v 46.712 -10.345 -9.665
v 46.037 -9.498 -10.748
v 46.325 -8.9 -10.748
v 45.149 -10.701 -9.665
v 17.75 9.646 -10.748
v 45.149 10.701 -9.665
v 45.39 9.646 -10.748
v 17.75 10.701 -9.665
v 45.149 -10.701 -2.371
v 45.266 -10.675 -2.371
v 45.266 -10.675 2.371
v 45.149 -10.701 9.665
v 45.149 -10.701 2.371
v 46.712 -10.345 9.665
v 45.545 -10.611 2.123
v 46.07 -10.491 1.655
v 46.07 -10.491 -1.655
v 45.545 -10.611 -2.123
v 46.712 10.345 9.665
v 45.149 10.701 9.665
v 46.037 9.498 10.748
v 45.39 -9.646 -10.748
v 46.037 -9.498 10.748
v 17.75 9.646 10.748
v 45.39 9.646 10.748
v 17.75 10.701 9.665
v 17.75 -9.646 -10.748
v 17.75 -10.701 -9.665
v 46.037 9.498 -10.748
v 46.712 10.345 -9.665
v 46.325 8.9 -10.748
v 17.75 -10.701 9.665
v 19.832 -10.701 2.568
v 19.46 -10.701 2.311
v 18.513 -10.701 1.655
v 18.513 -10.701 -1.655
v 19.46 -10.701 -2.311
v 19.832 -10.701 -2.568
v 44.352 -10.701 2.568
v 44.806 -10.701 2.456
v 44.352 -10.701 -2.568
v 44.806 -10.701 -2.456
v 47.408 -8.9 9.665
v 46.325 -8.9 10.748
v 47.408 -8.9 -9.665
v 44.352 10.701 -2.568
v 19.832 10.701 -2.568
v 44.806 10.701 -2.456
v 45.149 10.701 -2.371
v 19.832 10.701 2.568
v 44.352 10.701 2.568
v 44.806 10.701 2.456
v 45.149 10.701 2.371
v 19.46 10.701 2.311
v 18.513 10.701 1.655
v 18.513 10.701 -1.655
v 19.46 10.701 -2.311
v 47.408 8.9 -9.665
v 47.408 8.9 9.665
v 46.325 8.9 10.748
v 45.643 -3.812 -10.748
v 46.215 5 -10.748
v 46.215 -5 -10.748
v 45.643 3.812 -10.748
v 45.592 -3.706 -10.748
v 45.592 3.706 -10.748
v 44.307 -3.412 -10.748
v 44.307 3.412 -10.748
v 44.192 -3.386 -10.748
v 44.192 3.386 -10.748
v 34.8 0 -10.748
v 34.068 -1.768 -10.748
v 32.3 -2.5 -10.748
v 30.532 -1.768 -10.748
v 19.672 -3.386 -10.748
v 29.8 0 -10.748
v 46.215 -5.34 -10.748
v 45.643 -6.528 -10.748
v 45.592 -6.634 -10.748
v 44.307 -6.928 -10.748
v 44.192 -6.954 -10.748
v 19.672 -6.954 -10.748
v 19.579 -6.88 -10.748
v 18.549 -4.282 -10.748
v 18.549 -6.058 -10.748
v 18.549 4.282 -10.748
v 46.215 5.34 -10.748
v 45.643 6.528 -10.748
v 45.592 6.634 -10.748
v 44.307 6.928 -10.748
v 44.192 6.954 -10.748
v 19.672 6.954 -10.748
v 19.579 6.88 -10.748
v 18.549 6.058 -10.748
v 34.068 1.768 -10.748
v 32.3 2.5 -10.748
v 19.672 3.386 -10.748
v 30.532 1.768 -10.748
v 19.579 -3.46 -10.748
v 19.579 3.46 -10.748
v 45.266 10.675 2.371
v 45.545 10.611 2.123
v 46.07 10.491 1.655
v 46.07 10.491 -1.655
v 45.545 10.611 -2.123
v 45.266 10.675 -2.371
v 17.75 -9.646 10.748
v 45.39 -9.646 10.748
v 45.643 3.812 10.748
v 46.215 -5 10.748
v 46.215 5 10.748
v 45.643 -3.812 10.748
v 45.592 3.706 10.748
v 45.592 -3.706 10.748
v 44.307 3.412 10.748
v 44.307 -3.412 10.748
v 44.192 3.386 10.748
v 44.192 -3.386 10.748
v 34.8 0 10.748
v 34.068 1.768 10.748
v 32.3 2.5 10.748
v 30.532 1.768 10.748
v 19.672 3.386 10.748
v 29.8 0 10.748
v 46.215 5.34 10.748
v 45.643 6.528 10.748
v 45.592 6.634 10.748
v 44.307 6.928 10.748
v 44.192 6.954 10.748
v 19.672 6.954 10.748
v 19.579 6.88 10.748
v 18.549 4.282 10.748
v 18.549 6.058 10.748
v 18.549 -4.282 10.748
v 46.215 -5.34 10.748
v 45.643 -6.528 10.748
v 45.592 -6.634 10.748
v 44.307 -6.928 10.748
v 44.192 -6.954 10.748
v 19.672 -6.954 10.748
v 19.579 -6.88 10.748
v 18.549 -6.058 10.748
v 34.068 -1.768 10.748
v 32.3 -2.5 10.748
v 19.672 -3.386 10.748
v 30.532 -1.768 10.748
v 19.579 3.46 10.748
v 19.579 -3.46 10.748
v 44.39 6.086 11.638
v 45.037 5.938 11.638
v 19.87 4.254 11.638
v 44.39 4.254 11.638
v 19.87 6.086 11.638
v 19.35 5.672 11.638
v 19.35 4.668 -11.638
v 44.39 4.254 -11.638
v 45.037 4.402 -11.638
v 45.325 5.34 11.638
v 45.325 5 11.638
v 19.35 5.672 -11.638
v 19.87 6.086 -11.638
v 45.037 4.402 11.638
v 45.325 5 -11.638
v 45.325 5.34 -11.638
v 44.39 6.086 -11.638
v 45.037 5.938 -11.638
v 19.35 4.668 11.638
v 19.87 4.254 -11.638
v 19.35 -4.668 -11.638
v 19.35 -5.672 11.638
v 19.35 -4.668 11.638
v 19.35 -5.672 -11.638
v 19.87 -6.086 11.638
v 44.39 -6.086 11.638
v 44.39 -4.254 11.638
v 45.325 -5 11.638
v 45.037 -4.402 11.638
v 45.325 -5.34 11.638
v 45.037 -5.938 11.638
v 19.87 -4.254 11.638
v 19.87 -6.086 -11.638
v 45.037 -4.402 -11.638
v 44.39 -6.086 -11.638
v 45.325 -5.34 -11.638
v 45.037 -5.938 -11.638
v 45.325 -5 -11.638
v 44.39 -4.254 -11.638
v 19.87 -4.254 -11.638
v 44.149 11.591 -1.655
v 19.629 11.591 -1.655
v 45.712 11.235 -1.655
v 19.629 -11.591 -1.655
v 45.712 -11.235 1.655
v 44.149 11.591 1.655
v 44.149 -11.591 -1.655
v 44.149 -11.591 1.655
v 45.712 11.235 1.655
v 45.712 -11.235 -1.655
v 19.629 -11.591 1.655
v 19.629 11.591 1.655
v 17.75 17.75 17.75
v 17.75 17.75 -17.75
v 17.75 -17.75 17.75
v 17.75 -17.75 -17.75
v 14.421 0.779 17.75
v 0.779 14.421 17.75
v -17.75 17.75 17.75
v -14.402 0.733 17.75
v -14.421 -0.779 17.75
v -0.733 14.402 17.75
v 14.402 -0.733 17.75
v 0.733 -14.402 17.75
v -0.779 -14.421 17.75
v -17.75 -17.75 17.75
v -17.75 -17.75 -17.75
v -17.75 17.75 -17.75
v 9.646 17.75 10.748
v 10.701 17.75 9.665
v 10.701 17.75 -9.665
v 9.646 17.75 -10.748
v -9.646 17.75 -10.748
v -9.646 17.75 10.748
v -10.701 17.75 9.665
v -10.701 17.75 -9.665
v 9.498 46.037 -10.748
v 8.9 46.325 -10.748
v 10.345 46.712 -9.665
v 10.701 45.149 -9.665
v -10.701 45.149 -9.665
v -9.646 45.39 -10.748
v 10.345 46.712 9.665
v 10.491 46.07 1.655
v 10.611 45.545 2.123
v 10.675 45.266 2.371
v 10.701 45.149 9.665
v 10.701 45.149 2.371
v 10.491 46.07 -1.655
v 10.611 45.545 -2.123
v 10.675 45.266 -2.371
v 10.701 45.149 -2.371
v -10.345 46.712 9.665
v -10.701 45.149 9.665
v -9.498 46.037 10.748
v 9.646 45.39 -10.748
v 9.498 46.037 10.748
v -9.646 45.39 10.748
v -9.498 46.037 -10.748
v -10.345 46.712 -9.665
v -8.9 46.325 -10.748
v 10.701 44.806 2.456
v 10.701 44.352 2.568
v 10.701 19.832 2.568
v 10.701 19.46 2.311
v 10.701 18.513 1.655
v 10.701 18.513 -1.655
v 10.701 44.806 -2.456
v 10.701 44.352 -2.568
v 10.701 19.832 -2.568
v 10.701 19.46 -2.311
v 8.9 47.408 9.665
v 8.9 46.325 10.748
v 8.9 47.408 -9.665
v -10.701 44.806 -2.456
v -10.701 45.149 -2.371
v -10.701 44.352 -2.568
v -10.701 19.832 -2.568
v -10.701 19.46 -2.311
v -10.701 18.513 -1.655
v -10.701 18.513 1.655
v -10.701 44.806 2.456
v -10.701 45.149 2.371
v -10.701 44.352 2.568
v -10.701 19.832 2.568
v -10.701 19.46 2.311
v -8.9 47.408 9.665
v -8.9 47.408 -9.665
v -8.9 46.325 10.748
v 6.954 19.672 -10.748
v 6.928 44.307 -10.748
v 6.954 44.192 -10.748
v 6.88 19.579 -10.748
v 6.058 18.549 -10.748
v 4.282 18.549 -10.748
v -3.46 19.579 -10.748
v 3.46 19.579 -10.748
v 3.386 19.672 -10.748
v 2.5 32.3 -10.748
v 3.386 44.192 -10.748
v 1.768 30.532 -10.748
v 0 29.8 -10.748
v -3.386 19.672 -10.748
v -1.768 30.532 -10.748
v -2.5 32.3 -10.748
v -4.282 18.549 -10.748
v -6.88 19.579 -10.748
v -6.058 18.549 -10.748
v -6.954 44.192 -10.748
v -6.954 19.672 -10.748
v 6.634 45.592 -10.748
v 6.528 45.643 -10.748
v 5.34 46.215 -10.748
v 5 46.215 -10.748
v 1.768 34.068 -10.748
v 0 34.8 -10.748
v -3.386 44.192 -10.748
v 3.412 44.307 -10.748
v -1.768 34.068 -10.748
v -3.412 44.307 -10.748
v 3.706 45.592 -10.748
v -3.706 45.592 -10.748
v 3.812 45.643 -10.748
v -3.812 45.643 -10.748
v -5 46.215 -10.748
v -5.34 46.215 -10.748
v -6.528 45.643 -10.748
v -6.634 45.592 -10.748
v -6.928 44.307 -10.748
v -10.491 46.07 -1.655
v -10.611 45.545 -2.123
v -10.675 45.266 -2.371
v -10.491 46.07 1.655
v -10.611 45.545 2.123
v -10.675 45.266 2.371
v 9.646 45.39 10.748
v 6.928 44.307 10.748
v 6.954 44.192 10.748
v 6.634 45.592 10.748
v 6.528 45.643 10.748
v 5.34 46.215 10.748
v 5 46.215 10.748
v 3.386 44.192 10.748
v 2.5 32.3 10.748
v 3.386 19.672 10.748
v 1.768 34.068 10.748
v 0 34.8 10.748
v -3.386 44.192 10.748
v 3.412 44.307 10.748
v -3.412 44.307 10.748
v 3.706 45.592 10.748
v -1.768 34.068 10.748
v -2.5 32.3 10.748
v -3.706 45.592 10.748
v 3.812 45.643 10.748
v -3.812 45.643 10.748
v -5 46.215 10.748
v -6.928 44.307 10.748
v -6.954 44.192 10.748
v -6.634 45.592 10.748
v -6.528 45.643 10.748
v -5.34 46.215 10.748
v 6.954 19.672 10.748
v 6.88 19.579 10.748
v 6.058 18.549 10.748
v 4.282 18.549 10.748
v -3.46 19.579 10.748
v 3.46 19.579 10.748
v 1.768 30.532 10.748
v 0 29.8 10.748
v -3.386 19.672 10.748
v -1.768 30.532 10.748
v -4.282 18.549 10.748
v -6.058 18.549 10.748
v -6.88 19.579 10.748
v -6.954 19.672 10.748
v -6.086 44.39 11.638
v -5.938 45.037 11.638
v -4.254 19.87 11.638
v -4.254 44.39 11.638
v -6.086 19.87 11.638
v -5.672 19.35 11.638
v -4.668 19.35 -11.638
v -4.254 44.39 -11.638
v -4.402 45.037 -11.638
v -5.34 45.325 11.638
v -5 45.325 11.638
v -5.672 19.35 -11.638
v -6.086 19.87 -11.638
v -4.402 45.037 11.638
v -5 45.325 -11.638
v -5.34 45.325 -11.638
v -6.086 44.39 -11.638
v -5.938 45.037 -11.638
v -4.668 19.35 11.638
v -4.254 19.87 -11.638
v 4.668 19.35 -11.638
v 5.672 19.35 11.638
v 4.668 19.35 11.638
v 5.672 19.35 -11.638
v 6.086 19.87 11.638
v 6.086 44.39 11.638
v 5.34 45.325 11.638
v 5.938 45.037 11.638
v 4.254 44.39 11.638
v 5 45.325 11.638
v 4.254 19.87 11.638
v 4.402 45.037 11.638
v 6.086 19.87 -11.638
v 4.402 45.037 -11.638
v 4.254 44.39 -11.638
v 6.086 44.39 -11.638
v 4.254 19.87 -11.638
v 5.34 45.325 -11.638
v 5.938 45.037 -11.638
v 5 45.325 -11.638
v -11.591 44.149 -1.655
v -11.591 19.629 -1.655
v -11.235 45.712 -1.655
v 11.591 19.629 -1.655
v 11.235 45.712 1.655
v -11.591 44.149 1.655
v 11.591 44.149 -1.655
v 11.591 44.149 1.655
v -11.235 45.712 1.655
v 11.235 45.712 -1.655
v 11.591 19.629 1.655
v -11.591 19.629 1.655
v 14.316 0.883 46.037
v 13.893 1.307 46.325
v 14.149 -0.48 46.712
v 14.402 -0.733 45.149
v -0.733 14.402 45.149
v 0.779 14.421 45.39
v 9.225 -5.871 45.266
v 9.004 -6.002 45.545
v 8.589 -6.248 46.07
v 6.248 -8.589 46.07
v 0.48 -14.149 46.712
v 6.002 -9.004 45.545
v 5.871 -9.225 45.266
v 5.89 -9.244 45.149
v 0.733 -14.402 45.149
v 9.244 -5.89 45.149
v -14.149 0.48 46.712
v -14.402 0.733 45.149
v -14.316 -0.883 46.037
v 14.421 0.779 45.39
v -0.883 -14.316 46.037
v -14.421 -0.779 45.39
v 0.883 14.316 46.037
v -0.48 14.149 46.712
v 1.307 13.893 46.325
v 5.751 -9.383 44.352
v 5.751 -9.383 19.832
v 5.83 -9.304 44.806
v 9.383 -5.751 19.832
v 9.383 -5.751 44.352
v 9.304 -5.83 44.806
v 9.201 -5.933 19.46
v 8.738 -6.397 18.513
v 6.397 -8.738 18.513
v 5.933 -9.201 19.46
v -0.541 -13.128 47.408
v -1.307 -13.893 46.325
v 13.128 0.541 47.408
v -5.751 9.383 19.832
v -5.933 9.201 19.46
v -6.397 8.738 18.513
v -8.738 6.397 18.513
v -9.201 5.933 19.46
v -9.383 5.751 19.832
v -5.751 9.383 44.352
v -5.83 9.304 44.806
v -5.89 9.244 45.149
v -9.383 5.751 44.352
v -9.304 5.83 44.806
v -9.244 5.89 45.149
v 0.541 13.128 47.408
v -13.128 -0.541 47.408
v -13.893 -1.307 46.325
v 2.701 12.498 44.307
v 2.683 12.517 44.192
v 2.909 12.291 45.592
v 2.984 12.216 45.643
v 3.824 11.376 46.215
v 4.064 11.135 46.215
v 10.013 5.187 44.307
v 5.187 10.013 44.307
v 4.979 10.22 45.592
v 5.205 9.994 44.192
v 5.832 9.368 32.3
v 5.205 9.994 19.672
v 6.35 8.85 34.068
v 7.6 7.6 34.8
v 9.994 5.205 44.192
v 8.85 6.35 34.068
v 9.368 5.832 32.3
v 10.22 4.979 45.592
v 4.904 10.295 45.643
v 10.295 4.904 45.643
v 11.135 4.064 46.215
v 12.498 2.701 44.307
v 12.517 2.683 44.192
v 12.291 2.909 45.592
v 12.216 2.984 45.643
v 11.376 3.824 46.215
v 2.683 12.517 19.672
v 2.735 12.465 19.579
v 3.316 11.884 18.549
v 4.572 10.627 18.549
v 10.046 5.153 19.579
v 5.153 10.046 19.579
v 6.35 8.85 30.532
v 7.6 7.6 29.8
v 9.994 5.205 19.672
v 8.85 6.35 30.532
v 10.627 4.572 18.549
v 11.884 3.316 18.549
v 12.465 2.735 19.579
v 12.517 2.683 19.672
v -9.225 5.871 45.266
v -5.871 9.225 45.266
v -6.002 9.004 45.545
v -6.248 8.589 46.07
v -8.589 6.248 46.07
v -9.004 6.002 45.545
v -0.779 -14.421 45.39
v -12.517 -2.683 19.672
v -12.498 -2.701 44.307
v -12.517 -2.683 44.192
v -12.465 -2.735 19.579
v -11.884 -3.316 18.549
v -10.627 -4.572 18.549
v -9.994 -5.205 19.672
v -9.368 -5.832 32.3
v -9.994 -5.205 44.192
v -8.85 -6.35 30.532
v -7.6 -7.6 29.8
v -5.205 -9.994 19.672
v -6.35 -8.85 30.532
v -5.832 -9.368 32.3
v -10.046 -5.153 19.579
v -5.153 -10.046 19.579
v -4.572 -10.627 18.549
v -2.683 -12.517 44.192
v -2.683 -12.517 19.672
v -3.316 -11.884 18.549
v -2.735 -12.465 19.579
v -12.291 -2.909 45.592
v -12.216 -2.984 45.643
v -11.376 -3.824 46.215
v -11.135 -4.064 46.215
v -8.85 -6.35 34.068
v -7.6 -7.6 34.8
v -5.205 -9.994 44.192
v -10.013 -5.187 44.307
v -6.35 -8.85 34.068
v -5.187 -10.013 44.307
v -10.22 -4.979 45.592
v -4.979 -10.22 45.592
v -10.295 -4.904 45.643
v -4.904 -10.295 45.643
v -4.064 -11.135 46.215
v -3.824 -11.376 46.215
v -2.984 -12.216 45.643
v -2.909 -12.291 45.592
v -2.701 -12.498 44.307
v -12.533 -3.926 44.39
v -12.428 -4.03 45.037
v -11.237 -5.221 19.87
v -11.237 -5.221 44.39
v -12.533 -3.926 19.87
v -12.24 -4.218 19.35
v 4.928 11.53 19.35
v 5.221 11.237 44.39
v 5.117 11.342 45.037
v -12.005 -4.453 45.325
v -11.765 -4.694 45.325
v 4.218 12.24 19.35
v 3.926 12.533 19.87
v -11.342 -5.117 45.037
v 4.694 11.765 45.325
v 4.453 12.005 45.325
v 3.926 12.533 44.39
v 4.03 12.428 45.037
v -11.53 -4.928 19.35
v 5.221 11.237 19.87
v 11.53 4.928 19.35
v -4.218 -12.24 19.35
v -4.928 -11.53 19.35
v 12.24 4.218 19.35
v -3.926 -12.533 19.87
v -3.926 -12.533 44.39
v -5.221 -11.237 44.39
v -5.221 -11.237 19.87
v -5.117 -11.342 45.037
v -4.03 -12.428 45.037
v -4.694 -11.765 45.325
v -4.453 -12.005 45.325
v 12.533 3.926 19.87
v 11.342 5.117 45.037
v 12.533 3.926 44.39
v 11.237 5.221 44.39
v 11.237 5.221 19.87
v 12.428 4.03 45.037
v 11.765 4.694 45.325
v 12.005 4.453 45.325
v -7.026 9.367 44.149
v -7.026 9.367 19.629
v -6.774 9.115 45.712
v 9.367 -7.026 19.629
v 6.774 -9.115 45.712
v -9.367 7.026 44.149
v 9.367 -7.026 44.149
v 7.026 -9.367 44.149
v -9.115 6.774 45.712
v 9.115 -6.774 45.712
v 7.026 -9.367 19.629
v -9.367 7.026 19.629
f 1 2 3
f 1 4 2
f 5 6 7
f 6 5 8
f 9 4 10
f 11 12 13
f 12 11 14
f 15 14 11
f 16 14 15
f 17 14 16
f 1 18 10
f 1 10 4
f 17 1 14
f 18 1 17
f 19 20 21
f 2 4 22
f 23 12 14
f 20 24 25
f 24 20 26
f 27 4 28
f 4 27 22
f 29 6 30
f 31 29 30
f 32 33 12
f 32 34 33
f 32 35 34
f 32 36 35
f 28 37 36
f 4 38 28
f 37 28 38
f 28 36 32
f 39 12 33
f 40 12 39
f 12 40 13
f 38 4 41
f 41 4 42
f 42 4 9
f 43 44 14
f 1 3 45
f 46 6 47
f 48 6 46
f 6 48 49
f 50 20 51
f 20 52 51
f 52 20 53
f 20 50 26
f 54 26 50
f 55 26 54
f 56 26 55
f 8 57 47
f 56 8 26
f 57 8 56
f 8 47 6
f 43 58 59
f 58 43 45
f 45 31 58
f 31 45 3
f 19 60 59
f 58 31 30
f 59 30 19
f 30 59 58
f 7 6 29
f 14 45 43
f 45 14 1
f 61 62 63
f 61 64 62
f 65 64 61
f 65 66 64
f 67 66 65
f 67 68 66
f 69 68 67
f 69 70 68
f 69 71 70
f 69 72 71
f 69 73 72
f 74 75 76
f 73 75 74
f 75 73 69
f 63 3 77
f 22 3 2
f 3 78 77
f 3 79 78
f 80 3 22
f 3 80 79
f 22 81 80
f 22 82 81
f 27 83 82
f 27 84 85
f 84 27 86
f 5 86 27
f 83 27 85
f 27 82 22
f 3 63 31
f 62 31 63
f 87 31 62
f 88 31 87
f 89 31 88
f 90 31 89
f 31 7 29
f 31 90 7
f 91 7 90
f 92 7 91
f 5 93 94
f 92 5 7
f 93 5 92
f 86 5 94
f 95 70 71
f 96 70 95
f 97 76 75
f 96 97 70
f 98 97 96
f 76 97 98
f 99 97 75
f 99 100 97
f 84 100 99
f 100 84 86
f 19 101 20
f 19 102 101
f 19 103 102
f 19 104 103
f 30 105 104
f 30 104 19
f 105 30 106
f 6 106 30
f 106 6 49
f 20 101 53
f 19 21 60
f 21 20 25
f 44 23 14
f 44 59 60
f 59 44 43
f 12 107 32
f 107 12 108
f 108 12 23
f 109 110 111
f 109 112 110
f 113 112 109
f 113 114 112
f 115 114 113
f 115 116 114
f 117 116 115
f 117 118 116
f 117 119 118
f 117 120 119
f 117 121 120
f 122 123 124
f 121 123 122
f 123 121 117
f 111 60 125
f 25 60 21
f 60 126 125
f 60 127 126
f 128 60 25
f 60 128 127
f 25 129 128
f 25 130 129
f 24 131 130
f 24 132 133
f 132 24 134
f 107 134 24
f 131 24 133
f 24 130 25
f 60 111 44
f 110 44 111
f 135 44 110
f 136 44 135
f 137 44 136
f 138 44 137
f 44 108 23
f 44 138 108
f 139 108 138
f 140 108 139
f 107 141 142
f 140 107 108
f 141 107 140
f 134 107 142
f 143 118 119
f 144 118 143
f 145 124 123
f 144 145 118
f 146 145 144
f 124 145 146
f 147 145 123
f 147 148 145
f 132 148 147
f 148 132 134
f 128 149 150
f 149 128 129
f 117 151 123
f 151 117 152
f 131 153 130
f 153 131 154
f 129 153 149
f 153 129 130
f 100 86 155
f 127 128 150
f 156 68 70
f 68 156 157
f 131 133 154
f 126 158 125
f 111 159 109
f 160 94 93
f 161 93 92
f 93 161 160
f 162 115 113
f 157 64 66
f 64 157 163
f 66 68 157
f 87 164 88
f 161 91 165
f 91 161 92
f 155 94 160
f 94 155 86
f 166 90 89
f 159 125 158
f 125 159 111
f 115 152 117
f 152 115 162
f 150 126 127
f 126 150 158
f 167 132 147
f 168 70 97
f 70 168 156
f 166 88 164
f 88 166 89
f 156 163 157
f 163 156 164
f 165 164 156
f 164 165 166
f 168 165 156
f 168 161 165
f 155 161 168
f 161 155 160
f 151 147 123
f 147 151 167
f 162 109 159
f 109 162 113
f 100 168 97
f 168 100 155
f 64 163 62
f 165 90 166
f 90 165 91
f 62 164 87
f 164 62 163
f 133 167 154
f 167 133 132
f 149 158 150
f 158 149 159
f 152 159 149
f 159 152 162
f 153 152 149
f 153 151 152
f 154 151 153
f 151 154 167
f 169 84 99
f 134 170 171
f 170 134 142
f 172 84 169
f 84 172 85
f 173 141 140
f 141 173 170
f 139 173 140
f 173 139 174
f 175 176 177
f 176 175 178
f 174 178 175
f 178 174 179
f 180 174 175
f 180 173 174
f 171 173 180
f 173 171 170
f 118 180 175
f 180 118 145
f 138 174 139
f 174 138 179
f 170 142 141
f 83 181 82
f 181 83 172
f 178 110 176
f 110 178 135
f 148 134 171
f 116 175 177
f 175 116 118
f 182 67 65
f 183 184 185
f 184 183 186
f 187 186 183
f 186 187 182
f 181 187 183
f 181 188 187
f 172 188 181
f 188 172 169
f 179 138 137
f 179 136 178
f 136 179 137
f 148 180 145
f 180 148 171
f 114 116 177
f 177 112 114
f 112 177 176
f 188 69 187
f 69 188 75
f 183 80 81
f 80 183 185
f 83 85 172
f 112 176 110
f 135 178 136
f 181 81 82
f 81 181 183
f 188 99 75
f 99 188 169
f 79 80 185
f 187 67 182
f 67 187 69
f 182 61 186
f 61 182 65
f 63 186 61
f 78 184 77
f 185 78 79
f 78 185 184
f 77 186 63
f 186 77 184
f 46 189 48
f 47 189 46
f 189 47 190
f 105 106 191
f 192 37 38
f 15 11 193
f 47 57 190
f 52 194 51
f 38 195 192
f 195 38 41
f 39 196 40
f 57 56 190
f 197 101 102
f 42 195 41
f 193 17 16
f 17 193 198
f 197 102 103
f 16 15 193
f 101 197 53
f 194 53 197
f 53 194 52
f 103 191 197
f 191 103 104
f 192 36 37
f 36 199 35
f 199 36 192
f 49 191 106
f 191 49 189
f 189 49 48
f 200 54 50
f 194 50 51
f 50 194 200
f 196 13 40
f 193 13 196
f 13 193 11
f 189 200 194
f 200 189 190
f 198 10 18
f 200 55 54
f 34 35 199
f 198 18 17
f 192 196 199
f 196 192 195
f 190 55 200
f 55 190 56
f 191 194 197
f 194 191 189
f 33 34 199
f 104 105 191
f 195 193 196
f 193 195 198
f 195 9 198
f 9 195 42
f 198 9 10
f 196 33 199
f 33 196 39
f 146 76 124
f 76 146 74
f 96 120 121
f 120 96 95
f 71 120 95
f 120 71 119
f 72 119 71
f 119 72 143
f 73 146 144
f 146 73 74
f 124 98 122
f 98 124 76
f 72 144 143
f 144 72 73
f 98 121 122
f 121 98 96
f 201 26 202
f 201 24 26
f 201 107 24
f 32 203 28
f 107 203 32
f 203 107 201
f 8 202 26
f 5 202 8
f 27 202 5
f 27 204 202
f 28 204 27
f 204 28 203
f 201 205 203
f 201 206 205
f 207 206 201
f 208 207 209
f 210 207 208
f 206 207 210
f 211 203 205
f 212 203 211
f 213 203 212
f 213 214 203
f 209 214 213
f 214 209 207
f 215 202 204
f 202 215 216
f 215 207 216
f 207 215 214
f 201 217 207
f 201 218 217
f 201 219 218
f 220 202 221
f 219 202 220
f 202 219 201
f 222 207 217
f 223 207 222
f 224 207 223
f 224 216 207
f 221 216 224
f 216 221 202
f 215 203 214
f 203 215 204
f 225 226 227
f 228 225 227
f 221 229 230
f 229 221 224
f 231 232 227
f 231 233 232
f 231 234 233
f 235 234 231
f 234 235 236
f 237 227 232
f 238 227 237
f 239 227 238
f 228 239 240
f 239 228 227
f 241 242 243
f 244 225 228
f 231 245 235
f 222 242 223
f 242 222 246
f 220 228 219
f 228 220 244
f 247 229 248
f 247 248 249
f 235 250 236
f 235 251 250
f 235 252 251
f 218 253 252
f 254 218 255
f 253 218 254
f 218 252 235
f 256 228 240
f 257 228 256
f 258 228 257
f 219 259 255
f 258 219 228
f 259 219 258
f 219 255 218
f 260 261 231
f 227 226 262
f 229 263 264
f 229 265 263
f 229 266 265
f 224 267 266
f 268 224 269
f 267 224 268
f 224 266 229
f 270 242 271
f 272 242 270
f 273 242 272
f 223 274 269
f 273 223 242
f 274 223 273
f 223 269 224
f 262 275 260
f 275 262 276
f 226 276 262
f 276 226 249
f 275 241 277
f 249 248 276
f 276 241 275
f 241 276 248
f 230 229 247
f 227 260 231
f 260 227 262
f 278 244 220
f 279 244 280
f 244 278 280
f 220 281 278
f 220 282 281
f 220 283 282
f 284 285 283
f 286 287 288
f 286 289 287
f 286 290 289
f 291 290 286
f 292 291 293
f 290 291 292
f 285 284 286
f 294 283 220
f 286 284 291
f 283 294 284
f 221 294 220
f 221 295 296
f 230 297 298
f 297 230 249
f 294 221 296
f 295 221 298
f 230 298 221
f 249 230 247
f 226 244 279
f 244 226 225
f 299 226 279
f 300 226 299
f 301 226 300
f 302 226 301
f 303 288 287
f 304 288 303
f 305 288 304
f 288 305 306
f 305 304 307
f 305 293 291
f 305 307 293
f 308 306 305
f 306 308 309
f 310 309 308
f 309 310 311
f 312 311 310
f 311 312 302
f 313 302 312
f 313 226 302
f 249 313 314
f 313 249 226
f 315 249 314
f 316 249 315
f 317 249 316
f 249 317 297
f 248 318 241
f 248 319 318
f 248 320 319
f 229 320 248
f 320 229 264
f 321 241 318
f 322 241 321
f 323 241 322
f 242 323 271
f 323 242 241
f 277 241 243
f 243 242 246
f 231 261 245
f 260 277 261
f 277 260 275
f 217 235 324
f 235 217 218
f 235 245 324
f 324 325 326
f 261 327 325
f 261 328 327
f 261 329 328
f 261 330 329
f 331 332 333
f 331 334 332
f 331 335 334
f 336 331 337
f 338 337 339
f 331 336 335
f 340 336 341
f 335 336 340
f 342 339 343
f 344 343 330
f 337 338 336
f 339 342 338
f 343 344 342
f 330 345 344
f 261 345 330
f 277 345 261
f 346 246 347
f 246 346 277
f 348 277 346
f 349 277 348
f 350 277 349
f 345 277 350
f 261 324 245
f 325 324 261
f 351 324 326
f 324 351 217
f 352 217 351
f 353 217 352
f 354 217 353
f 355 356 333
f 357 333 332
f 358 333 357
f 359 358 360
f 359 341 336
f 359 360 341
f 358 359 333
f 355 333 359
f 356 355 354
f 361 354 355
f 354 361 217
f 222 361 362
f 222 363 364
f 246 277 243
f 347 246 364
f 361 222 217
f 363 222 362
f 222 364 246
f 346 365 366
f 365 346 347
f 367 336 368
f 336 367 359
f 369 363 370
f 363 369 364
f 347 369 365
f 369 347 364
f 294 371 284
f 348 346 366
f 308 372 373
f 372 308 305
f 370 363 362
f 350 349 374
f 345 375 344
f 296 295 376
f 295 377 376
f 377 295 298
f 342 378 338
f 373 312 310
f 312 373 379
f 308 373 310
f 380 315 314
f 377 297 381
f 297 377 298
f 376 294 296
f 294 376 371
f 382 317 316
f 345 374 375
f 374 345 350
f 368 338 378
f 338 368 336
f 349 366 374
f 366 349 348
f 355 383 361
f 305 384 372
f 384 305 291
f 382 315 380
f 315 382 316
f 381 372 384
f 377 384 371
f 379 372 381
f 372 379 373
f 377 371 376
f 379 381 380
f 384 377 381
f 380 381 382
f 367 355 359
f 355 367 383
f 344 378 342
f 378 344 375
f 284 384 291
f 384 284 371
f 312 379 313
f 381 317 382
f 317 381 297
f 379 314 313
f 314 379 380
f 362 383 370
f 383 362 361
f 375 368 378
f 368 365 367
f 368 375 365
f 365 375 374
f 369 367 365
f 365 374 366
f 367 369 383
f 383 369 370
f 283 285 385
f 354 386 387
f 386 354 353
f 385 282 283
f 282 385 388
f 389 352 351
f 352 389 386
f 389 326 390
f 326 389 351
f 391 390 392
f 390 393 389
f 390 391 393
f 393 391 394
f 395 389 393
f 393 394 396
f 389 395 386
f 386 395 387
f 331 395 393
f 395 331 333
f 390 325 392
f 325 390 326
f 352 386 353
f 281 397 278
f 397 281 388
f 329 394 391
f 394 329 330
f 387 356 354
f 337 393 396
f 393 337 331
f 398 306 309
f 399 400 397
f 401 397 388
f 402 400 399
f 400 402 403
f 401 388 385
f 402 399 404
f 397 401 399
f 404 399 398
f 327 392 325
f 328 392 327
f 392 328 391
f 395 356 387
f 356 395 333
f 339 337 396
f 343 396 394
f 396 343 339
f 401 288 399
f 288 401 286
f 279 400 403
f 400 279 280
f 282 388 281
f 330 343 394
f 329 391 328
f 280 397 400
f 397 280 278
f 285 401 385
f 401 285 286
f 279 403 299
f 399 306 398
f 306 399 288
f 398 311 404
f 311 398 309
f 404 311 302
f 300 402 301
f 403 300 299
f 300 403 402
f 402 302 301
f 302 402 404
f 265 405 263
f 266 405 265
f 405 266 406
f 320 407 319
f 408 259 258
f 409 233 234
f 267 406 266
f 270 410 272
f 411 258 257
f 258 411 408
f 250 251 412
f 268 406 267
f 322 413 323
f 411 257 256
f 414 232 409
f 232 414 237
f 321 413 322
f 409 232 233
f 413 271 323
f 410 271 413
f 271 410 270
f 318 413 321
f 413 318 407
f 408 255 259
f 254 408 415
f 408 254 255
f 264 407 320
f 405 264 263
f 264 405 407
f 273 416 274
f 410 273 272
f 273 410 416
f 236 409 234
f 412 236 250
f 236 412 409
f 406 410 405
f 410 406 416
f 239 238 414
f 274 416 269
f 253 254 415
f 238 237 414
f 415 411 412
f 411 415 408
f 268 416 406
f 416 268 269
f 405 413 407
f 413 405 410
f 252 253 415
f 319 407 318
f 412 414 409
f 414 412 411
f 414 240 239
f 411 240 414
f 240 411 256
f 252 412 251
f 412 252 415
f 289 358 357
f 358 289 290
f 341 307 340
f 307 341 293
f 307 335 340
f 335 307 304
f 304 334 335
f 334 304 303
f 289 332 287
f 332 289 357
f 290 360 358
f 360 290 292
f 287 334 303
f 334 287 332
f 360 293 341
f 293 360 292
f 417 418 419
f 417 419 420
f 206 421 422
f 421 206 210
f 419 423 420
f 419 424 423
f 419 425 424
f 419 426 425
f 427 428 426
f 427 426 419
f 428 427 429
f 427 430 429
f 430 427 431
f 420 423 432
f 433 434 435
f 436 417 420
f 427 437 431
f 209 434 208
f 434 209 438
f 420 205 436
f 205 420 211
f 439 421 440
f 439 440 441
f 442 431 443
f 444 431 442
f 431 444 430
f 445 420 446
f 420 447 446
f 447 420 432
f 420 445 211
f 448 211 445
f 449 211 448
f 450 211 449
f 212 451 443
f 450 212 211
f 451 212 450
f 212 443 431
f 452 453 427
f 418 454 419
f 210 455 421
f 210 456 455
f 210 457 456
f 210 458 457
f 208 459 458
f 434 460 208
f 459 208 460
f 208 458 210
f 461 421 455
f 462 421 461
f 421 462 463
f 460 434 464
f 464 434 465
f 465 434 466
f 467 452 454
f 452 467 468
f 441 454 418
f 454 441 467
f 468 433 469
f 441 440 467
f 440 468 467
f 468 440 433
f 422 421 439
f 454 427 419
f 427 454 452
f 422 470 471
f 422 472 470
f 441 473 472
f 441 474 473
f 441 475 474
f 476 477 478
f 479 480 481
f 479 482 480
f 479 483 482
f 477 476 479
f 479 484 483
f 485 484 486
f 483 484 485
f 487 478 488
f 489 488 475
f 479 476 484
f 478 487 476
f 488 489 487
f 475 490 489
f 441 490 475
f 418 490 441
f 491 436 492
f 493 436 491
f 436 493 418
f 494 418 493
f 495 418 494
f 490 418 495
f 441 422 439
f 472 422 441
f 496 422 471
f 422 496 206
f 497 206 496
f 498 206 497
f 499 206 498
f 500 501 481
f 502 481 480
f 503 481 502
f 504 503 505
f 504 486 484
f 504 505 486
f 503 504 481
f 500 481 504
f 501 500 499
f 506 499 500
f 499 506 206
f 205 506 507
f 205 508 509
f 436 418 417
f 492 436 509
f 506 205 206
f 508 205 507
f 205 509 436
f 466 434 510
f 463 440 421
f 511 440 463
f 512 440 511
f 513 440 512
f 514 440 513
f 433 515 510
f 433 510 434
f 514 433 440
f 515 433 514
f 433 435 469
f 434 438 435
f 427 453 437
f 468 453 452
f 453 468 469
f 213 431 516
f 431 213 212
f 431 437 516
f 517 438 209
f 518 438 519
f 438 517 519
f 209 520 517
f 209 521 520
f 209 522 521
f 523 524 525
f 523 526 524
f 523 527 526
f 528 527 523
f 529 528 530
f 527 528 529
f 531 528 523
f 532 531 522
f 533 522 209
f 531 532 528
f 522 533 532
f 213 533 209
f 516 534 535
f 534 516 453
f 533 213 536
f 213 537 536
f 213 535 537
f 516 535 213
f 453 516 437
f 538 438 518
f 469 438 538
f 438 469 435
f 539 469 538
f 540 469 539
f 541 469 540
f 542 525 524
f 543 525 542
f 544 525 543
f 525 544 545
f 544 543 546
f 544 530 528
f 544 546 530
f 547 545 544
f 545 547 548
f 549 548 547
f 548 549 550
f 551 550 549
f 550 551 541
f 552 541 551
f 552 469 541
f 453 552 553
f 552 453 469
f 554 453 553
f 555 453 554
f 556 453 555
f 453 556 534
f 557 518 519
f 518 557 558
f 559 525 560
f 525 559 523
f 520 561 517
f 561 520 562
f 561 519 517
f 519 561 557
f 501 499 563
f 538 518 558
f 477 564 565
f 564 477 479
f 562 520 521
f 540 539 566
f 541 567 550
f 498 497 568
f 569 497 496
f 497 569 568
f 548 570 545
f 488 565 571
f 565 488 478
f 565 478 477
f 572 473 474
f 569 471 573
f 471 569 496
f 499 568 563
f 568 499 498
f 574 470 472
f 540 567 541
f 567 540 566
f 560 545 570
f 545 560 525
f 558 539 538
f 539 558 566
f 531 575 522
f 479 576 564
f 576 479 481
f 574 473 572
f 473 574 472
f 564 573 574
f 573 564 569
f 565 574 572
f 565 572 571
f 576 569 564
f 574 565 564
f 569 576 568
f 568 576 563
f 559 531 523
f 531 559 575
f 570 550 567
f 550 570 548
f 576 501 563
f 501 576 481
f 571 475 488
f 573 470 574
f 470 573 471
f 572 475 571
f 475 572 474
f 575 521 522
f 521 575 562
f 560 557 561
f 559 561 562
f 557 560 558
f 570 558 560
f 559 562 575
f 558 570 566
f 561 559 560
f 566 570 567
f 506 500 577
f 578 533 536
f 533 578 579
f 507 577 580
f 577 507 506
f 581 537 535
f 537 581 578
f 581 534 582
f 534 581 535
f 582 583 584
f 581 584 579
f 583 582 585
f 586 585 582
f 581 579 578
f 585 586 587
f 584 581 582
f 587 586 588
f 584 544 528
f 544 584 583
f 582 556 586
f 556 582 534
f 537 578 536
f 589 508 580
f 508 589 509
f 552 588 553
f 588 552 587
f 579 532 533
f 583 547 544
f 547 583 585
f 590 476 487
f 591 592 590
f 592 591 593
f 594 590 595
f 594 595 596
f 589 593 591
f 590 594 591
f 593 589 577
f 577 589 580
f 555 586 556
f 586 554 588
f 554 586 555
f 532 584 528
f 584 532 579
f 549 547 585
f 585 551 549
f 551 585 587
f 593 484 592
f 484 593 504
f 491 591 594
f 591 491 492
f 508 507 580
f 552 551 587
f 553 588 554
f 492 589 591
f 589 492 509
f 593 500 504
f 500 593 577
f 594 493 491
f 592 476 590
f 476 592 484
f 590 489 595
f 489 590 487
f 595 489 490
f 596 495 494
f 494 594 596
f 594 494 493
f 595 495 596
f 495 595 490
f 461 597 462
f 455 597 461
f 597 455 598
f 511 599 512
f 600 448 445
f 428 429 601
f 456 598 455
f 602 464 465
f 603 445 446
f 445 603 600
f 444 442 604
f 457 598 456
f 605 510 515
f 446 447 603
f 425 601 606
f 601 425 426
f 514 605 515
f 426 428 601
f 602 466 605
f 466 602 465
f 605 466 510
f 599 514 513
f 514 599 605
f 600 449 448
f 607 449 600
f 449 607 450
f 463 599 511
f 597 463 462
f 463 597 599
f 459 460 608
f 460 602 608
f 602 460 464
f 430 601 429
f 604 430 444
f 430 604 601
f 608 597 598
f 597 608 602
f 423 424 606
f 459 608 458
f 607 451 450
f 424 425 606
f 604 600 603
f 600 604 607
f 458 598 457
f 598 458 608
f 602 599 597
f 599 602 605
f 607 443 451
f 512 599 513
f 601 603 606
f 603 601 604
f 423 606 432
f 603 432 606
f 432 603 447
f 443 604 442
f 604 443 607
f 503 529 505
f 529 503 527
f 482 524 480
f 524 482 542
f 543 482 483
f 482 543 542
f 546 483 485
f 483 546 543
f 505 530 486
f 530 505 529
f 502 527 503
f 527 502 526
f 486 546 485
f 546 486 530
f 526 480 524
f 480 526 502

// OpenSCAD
module sqt_insert(size, rounding)
{
   hole_d = 5;
   cube_v = [size[0] - rounding, size[1] - 2*rounding, size[2] - 2*rounding];
   difference()
   {
       union()
       {
           intersection()
           {
              translate([-0.5*rounding, 0, 0])
              {
                 minkowski()
                 {
                     cube(cube_v, center=true);
                     sphere(rounding);

                 }
              }
              //Slice off one edge to make it flat
              translate([0, 0, 0])
              {
                 cube(size, center=true);
              }
           }

           // Tabs for good fit
           minkowski()
           {
               cube([cube_v[0] - 2 * rounding, cube_v[1] + cube_v[1] / 10, cube_v[2] / 10], center=true);
               sphere(rounding);
           }
           minkowski()
           {
               difference()
               {
                   cube([cube_v[0] - 2 * rounding, 6 * cube_v[1] / 10, cube_v[2] + cube_v[2] / 10], center=true);
                   cube([cube_v[0] - 2 * rounding, 2 * hole_d, cube_v[2] + cube_v[2] / 10], center=true);
               }
               sphere(rounding);
           }
       }

       // Hole for fastening
       translate([0, 0, -size[2] / 2 - 1])
       {
         cylinder(r=(hole_d / 2), h=size[1] + 2);
       }
   }


}

module sqt_end_stop(size, wall_thickness, insert_rounding=2, base_scale=1)
{
    enlarge = 1.42;
    penetration = 1.4;
    cube([base_scale  * size, base_scale * size, base_scale * size], center=true);
    insert_size = size - 2*wall_thickness;
    translate([base_scale * size - 2 * wall_thickness, 0, 0])
    {
       sqt_insert(size=[penetration * insert_size, insert_size, insert_size], rounding=insert_rounding);
    }
}

module sqt_connector(size, wall_thickness, ways=2, flat=true, insert_rounding=2, base_scale=1)
{

  way_angles = [[0, 0, 0],[0, 0, 90],[0, 0, 180],[0, 0, 270],[0, -90, 0],[0, 90, 0]];

  if (ways == 1)
  {
    rotate([0, (flat == false ? -90 : 0), 0])
    {
      sqt_end_stop(size=size, wall_thickness=wall_thickness, insert_rounding=insert_rounding, base_scale=base_scale);
    }
  }
  else
  {
    union()
    {
      sqt_connector(size=size, wall_thickness=wall_thickness, ways=ways-1, flat=flat, insert_rounding=insert_rounding, base_scale=base_scale);
      rotate(way_angles[ways-1])
      {
        sqt_end_stop(size=size, wall_thickness=wall_thickness, insert_rounding=insert_rounding, base_scale=base_scale);
      }
    }
  }
}

module sqt_3_way_rotated(size, wall_thickness, insert_rounding)
{
  base_scale = 1.42;
  penetration = 1.4;
  union()
  {
    sqt_connector(size=size, wall_thickness=wall_thickness, ways=2, insert_rounding=insert_rounding, base_scale=base_scale);
    rotate([0, -90, 45] )
    {
        insert_size = size - 2*wall_thickness;
        translate([base_scale * size - 2 * wall_thickness, 0, 0])
        {
           sqt_insert(size=[penetration * insert_size, insert_size, insert_size], rounding=insert_rounding);
        }
    }
  }
}

// You can use the following statements to display the correct connector
*sqt_insert(size=[25, 25, 25], rounding=2);
*sqt_connector(size=25, wall_thickness=1.6, ways=1);
*sqt_connector(size=25, wall_thickness=1.6, ways=2);
*sqt_connector(size=25, wall_thickness=1.6, ways=3, flat=true);
*sqt_connector(size=25, wall_thickness=1.6, ways=3, flat=false);
*sqt_connector(size=25, wall_thickness=1.6, ways=4);
*sqt_connector(size=25, wall_thickness=1.6, ways=4, flat=false);
*sqt_connector(size=25, wall_thickness=1.6, ways=5);
*sqt_connector(size=25, wall_thickness=1.6, ways=6);
sqt_3_way_rotated(size=25, wall_thickness=1.6, insert_rounding=2);
